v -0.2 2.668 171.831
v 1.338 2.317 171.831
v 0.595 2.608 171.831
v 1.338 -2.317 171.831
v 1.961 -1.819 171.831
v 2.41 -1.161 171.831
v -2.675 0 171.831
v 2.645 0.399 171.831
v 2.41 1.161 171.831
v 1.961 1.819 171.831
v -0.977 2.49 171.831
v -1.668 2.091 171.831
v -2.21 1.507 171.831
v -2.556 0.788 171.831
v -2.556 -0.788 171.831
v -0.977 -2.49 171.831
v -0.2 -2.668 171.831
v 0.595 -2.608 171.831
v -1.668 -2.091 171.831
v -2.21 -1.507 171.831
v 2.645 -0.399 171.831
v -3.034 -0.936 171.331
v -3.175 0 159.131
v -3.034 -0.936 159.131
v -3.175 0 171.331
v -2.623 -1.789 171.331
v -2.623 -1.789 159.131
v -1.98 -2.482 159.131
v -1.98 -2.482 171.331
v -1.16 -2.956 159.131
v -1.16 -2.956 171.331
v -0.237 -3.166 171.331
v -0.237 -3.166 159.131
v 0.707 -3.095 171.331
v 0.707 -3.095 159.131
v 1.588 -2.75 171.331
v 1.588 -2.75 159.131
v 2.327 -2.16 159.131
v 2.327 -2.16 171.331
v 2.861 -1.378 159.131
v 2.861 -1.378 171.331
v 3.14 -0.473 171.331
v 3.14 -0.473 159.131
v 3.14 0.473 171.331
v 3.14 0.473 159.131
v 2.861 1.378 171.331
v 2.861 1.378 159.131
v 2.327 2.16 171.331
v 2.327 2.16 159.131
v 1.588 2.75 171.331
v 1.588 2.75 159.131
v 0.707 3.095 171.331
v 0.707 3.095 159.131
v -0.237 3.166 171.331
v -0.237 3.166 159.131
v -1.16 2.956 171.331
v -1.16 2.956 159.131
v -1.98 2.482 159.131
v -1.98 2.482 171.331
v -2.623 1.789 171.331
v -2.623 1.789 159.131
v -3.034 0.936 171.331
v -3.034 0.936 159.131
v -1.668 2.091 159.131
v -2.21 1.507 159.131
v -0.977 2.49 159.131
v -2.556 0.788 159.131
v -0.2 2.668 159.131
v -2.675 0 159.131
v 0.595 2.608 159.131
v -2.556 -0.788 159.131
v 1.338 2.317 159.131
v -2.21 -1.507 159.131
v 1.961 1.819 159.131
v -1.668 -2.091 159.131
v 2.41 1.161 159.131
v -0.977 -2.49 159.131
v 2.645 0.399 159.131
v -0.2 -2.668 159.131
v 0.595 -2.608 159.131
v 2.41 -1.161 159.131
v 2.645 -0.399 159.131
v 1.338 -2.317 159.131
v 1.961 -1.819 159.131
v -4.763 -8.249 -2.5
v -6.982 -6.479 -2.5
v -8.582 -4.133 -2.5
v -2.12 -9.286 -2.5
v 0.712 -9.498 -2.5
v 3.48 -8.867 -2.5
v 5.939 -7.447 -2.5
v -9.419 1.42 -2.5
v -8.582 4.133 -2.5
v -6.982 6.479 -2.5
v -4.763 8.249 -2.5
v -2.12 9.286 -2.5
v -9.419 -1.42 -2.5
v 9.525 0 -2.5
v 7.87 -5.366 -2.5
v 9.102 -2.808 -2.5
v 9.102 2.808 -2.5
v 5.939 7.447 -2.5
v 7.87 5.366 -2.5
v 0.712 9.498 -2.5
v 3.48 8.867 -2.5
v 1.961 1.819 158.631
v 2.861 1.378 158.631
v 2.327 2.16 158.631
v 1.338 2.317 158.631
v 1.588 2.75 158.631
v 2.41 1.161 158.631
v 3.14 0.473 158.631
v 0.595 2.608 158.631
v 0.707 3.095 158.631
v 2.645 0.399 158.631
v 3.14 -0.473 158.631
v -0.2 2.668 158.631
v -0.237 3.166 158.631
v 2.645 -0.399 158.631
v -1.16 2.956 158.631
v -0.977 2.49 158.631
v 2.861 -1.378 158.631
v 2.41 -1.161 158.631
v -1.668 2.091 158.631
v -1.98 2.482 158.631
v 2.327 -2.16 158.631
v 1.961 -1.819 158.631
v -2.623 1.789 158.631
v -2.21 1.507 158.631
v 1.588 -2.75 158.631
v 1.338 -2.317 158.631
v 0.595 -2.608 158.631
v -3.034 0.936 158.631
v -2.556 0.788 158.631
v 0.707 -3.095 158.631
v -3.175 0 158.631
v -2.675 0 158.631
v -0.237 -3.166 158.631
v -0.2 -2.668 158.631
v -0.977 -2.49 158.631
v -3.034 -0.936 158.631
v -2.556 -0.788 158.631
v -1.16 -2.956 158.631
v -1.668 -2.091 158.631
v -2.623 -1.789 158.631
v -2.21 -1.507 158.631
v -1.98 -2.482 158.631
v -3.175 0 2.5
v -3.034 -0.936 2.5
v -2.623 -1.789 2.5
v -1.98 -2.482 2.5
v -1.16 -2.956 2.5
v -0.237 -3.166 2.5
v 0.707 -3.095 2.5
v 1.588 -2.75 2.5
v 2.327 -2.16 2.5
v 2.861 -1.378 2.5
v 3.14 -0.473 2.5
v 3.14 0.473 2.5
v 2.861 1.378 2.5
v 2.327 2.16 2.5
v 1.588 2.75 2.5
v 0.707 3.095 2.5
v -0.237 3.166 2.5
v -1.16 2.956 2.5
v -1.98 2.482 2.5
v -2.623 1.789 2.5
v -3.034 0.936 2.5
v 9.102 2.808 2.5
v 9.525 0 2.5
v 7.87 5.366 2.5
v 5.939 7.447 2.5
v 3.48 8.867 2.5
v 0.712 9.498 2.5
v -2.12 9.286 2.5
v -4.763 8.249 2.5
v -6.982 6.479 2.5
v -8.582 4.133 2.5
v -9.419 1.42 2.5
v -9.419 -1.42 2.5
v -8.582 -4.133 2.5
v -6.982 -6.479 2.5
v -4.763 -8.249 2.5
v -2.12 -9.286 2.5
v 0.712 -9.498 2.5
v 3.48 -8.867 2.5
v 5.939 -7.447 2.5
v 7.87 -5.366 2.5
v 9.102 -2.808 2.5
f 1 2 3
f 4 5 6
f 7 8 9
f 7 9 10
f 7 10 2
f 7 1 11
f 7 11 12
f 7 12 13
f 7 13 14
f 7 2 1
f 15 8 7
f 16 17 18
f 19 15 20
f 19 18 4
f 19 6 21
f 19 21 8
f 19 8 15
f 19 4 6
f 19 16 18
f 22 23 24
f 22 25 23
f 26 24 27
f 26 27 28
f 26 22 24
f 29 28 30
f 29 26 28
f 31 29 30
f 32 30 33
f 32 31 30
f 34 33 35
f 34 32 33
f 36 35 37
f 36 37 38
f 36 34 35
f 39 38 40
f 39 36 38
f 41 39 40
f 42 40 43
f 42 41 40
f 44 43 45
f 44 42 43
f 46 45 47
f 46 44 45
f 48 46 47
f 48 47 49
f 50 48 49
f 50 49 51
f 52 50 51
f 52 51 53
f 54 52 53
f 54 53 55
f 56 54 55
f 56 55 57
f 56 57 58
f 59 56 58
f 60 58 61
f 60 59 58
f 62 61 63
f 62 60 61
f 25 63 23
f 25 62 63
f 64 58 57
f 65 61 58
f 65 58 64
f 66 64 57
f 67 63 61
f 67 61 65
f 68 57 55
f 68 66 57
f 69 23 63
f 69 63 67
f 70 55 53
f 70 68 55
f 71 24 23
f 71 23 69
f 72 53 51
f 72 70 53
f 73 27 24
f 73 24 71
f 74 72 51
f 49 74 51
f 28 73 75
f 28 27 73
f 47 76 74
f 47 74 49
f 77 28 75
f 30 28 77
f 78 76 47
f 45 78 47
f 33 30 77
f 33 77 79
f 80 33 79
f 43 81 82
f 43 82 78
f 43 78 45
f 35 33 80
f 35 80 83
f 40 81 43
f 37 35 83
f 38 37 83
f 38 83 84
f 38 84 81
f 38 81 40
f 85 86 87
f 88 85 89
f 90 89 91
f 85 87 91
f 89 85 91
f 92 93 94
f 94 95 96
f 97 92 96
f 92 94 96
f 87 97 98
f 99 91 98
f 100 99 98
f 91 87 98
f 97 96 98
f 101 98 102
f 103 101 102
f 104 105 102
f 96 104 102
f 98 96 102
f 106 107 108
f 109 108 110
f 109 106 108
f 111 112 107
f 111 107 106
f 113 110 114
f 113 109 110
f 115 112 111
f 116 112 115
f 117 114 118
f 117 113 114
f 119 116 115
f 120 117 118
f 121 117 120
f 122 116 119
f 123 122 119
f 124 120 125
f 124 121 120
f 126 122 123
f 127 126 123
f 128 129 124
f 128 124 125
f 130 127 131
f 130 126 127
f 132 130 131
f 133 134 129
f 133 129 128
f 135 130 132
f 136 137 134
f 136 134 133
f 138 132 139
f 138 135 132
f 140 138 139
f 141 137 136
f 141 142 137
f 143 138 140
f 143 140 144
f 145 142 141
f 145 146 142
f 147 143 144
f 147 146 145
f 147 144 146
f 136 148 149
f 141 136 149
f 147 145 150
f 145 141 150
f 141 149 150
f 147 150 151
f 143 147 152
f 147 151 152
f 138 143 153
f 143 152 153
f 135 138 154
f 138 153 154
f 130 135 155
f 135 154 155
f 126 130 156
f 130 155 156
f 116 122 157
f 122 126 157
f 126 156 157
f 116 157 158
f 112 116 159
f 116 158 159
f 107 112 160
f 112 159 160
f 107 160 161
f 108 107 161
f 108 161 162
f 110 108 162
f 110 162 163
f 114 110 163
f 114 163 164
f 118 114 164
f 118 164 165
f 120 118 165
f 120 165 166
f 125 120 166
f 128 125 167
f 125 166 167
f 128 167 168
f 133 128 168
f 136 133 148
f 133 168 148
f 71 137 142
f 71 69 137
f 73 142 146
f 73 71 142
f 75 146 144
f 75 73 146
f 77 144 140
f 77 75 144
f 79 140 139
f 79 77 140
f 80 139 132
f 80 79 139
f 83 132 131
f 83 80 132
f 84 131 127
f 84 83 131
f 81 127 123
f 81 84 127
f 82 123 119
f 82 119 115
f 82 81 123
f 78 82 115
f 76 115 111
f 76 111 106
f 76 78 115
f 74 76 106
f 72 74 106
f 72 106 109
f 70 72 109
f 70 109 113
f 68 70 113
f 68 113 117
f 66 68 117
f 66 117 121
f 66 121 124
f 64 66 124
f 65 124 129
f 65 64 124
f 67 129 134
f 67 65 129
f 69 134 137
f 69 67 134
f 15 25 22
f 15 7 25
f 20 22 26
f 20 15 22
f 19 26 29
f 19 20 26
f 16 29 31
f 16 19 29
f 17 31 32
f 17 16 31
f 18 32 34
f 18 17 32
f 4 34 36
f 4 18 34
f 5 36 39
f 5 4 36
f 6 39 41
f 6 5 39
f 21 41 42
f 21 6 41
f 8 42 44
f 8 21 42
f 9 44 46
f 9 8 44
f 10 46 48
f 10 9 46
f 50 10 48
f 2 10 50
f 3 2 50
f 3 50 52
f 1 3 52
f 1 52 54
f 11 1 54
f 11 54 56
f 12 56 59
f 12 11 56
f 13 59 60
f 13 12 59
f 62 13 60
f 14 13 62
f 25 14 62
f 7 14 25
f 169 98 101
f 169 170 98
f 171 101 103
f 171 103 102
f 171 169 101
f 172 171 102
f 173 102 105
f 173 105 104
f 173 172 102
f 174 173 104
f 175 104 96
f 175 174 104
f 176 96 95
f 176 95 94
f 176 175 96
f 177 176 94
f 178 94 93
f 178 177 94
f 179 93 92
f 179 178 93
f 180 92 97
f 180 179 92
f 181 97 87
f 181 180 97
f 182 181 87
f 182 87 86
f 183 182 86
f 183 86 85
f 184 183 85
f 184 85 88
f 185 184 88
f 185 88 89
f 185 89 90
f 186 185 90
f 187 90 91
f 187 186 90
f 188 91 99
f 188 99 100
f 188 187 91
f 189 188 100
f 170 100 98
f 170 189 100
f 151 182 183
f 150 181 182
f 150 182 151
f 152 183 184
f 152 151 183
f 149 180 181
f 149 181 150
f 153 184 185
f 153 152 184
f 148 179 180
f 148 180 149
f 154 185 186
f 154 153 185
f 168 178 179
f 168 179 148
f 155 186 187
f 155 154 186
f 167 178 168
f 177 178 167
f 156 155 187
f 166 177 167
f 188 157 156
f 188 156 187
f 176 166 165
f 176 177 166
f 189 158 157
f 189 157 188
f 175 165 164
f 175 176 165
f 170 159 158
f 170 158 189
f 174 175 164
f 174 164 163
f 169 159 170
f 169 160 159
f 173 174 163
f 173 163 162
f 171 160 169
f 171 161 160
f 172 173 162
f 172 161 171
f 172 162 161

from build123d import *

# Parameters (mm, degrees)
SKETCH1_R      = 3.175
EXTRUDE1_DEPTH = 171.831
SKETCH2_R      = 9.525
PISTON_DEPTH   = 2.5


with BuildPart() as part:
    # Sketch1 → Extrude1 (new body)
    with BuildSketch(Plane.XY):
        with Locations(Location((0, 0, 0), (0, 0, 180))):
            Circle(SKETCH1_R)
    extrude(amount=EXTRUDE1_DEPTH)

    # Sketch2 → Piston (add, symmetric)
    with BuildSketch(Plane.XY):
        Circle(SKETCH2_R)
    extrude(amount=PISTON_DEPTH, both=True)

    # Sketch3 → Threads (revolve, cut)
    with BuildSketch(Plane(origin=(0, 0, 0), x_dir=(0, 0, -1), z_dir=(1, 0, 0)), mode=Mode.PRIVATE) as threads_sk:
        Polygon((-171.831, 9.525), (-158.631, 9.525), (-158.631, 2.675), (-159.131, 2.675), (-159.131, 3.175), (-171.331, 3.175), (-171.831, 2.675), align=None)
    revolve(threads_sk.sketch.rotate(Axis((0, 0, 0), (0, 0, 1)), 90), axis=Axis((0, 0, 0), (0, 0, 1)), mode=Mode.SUBTRACT)


solid = part.part
